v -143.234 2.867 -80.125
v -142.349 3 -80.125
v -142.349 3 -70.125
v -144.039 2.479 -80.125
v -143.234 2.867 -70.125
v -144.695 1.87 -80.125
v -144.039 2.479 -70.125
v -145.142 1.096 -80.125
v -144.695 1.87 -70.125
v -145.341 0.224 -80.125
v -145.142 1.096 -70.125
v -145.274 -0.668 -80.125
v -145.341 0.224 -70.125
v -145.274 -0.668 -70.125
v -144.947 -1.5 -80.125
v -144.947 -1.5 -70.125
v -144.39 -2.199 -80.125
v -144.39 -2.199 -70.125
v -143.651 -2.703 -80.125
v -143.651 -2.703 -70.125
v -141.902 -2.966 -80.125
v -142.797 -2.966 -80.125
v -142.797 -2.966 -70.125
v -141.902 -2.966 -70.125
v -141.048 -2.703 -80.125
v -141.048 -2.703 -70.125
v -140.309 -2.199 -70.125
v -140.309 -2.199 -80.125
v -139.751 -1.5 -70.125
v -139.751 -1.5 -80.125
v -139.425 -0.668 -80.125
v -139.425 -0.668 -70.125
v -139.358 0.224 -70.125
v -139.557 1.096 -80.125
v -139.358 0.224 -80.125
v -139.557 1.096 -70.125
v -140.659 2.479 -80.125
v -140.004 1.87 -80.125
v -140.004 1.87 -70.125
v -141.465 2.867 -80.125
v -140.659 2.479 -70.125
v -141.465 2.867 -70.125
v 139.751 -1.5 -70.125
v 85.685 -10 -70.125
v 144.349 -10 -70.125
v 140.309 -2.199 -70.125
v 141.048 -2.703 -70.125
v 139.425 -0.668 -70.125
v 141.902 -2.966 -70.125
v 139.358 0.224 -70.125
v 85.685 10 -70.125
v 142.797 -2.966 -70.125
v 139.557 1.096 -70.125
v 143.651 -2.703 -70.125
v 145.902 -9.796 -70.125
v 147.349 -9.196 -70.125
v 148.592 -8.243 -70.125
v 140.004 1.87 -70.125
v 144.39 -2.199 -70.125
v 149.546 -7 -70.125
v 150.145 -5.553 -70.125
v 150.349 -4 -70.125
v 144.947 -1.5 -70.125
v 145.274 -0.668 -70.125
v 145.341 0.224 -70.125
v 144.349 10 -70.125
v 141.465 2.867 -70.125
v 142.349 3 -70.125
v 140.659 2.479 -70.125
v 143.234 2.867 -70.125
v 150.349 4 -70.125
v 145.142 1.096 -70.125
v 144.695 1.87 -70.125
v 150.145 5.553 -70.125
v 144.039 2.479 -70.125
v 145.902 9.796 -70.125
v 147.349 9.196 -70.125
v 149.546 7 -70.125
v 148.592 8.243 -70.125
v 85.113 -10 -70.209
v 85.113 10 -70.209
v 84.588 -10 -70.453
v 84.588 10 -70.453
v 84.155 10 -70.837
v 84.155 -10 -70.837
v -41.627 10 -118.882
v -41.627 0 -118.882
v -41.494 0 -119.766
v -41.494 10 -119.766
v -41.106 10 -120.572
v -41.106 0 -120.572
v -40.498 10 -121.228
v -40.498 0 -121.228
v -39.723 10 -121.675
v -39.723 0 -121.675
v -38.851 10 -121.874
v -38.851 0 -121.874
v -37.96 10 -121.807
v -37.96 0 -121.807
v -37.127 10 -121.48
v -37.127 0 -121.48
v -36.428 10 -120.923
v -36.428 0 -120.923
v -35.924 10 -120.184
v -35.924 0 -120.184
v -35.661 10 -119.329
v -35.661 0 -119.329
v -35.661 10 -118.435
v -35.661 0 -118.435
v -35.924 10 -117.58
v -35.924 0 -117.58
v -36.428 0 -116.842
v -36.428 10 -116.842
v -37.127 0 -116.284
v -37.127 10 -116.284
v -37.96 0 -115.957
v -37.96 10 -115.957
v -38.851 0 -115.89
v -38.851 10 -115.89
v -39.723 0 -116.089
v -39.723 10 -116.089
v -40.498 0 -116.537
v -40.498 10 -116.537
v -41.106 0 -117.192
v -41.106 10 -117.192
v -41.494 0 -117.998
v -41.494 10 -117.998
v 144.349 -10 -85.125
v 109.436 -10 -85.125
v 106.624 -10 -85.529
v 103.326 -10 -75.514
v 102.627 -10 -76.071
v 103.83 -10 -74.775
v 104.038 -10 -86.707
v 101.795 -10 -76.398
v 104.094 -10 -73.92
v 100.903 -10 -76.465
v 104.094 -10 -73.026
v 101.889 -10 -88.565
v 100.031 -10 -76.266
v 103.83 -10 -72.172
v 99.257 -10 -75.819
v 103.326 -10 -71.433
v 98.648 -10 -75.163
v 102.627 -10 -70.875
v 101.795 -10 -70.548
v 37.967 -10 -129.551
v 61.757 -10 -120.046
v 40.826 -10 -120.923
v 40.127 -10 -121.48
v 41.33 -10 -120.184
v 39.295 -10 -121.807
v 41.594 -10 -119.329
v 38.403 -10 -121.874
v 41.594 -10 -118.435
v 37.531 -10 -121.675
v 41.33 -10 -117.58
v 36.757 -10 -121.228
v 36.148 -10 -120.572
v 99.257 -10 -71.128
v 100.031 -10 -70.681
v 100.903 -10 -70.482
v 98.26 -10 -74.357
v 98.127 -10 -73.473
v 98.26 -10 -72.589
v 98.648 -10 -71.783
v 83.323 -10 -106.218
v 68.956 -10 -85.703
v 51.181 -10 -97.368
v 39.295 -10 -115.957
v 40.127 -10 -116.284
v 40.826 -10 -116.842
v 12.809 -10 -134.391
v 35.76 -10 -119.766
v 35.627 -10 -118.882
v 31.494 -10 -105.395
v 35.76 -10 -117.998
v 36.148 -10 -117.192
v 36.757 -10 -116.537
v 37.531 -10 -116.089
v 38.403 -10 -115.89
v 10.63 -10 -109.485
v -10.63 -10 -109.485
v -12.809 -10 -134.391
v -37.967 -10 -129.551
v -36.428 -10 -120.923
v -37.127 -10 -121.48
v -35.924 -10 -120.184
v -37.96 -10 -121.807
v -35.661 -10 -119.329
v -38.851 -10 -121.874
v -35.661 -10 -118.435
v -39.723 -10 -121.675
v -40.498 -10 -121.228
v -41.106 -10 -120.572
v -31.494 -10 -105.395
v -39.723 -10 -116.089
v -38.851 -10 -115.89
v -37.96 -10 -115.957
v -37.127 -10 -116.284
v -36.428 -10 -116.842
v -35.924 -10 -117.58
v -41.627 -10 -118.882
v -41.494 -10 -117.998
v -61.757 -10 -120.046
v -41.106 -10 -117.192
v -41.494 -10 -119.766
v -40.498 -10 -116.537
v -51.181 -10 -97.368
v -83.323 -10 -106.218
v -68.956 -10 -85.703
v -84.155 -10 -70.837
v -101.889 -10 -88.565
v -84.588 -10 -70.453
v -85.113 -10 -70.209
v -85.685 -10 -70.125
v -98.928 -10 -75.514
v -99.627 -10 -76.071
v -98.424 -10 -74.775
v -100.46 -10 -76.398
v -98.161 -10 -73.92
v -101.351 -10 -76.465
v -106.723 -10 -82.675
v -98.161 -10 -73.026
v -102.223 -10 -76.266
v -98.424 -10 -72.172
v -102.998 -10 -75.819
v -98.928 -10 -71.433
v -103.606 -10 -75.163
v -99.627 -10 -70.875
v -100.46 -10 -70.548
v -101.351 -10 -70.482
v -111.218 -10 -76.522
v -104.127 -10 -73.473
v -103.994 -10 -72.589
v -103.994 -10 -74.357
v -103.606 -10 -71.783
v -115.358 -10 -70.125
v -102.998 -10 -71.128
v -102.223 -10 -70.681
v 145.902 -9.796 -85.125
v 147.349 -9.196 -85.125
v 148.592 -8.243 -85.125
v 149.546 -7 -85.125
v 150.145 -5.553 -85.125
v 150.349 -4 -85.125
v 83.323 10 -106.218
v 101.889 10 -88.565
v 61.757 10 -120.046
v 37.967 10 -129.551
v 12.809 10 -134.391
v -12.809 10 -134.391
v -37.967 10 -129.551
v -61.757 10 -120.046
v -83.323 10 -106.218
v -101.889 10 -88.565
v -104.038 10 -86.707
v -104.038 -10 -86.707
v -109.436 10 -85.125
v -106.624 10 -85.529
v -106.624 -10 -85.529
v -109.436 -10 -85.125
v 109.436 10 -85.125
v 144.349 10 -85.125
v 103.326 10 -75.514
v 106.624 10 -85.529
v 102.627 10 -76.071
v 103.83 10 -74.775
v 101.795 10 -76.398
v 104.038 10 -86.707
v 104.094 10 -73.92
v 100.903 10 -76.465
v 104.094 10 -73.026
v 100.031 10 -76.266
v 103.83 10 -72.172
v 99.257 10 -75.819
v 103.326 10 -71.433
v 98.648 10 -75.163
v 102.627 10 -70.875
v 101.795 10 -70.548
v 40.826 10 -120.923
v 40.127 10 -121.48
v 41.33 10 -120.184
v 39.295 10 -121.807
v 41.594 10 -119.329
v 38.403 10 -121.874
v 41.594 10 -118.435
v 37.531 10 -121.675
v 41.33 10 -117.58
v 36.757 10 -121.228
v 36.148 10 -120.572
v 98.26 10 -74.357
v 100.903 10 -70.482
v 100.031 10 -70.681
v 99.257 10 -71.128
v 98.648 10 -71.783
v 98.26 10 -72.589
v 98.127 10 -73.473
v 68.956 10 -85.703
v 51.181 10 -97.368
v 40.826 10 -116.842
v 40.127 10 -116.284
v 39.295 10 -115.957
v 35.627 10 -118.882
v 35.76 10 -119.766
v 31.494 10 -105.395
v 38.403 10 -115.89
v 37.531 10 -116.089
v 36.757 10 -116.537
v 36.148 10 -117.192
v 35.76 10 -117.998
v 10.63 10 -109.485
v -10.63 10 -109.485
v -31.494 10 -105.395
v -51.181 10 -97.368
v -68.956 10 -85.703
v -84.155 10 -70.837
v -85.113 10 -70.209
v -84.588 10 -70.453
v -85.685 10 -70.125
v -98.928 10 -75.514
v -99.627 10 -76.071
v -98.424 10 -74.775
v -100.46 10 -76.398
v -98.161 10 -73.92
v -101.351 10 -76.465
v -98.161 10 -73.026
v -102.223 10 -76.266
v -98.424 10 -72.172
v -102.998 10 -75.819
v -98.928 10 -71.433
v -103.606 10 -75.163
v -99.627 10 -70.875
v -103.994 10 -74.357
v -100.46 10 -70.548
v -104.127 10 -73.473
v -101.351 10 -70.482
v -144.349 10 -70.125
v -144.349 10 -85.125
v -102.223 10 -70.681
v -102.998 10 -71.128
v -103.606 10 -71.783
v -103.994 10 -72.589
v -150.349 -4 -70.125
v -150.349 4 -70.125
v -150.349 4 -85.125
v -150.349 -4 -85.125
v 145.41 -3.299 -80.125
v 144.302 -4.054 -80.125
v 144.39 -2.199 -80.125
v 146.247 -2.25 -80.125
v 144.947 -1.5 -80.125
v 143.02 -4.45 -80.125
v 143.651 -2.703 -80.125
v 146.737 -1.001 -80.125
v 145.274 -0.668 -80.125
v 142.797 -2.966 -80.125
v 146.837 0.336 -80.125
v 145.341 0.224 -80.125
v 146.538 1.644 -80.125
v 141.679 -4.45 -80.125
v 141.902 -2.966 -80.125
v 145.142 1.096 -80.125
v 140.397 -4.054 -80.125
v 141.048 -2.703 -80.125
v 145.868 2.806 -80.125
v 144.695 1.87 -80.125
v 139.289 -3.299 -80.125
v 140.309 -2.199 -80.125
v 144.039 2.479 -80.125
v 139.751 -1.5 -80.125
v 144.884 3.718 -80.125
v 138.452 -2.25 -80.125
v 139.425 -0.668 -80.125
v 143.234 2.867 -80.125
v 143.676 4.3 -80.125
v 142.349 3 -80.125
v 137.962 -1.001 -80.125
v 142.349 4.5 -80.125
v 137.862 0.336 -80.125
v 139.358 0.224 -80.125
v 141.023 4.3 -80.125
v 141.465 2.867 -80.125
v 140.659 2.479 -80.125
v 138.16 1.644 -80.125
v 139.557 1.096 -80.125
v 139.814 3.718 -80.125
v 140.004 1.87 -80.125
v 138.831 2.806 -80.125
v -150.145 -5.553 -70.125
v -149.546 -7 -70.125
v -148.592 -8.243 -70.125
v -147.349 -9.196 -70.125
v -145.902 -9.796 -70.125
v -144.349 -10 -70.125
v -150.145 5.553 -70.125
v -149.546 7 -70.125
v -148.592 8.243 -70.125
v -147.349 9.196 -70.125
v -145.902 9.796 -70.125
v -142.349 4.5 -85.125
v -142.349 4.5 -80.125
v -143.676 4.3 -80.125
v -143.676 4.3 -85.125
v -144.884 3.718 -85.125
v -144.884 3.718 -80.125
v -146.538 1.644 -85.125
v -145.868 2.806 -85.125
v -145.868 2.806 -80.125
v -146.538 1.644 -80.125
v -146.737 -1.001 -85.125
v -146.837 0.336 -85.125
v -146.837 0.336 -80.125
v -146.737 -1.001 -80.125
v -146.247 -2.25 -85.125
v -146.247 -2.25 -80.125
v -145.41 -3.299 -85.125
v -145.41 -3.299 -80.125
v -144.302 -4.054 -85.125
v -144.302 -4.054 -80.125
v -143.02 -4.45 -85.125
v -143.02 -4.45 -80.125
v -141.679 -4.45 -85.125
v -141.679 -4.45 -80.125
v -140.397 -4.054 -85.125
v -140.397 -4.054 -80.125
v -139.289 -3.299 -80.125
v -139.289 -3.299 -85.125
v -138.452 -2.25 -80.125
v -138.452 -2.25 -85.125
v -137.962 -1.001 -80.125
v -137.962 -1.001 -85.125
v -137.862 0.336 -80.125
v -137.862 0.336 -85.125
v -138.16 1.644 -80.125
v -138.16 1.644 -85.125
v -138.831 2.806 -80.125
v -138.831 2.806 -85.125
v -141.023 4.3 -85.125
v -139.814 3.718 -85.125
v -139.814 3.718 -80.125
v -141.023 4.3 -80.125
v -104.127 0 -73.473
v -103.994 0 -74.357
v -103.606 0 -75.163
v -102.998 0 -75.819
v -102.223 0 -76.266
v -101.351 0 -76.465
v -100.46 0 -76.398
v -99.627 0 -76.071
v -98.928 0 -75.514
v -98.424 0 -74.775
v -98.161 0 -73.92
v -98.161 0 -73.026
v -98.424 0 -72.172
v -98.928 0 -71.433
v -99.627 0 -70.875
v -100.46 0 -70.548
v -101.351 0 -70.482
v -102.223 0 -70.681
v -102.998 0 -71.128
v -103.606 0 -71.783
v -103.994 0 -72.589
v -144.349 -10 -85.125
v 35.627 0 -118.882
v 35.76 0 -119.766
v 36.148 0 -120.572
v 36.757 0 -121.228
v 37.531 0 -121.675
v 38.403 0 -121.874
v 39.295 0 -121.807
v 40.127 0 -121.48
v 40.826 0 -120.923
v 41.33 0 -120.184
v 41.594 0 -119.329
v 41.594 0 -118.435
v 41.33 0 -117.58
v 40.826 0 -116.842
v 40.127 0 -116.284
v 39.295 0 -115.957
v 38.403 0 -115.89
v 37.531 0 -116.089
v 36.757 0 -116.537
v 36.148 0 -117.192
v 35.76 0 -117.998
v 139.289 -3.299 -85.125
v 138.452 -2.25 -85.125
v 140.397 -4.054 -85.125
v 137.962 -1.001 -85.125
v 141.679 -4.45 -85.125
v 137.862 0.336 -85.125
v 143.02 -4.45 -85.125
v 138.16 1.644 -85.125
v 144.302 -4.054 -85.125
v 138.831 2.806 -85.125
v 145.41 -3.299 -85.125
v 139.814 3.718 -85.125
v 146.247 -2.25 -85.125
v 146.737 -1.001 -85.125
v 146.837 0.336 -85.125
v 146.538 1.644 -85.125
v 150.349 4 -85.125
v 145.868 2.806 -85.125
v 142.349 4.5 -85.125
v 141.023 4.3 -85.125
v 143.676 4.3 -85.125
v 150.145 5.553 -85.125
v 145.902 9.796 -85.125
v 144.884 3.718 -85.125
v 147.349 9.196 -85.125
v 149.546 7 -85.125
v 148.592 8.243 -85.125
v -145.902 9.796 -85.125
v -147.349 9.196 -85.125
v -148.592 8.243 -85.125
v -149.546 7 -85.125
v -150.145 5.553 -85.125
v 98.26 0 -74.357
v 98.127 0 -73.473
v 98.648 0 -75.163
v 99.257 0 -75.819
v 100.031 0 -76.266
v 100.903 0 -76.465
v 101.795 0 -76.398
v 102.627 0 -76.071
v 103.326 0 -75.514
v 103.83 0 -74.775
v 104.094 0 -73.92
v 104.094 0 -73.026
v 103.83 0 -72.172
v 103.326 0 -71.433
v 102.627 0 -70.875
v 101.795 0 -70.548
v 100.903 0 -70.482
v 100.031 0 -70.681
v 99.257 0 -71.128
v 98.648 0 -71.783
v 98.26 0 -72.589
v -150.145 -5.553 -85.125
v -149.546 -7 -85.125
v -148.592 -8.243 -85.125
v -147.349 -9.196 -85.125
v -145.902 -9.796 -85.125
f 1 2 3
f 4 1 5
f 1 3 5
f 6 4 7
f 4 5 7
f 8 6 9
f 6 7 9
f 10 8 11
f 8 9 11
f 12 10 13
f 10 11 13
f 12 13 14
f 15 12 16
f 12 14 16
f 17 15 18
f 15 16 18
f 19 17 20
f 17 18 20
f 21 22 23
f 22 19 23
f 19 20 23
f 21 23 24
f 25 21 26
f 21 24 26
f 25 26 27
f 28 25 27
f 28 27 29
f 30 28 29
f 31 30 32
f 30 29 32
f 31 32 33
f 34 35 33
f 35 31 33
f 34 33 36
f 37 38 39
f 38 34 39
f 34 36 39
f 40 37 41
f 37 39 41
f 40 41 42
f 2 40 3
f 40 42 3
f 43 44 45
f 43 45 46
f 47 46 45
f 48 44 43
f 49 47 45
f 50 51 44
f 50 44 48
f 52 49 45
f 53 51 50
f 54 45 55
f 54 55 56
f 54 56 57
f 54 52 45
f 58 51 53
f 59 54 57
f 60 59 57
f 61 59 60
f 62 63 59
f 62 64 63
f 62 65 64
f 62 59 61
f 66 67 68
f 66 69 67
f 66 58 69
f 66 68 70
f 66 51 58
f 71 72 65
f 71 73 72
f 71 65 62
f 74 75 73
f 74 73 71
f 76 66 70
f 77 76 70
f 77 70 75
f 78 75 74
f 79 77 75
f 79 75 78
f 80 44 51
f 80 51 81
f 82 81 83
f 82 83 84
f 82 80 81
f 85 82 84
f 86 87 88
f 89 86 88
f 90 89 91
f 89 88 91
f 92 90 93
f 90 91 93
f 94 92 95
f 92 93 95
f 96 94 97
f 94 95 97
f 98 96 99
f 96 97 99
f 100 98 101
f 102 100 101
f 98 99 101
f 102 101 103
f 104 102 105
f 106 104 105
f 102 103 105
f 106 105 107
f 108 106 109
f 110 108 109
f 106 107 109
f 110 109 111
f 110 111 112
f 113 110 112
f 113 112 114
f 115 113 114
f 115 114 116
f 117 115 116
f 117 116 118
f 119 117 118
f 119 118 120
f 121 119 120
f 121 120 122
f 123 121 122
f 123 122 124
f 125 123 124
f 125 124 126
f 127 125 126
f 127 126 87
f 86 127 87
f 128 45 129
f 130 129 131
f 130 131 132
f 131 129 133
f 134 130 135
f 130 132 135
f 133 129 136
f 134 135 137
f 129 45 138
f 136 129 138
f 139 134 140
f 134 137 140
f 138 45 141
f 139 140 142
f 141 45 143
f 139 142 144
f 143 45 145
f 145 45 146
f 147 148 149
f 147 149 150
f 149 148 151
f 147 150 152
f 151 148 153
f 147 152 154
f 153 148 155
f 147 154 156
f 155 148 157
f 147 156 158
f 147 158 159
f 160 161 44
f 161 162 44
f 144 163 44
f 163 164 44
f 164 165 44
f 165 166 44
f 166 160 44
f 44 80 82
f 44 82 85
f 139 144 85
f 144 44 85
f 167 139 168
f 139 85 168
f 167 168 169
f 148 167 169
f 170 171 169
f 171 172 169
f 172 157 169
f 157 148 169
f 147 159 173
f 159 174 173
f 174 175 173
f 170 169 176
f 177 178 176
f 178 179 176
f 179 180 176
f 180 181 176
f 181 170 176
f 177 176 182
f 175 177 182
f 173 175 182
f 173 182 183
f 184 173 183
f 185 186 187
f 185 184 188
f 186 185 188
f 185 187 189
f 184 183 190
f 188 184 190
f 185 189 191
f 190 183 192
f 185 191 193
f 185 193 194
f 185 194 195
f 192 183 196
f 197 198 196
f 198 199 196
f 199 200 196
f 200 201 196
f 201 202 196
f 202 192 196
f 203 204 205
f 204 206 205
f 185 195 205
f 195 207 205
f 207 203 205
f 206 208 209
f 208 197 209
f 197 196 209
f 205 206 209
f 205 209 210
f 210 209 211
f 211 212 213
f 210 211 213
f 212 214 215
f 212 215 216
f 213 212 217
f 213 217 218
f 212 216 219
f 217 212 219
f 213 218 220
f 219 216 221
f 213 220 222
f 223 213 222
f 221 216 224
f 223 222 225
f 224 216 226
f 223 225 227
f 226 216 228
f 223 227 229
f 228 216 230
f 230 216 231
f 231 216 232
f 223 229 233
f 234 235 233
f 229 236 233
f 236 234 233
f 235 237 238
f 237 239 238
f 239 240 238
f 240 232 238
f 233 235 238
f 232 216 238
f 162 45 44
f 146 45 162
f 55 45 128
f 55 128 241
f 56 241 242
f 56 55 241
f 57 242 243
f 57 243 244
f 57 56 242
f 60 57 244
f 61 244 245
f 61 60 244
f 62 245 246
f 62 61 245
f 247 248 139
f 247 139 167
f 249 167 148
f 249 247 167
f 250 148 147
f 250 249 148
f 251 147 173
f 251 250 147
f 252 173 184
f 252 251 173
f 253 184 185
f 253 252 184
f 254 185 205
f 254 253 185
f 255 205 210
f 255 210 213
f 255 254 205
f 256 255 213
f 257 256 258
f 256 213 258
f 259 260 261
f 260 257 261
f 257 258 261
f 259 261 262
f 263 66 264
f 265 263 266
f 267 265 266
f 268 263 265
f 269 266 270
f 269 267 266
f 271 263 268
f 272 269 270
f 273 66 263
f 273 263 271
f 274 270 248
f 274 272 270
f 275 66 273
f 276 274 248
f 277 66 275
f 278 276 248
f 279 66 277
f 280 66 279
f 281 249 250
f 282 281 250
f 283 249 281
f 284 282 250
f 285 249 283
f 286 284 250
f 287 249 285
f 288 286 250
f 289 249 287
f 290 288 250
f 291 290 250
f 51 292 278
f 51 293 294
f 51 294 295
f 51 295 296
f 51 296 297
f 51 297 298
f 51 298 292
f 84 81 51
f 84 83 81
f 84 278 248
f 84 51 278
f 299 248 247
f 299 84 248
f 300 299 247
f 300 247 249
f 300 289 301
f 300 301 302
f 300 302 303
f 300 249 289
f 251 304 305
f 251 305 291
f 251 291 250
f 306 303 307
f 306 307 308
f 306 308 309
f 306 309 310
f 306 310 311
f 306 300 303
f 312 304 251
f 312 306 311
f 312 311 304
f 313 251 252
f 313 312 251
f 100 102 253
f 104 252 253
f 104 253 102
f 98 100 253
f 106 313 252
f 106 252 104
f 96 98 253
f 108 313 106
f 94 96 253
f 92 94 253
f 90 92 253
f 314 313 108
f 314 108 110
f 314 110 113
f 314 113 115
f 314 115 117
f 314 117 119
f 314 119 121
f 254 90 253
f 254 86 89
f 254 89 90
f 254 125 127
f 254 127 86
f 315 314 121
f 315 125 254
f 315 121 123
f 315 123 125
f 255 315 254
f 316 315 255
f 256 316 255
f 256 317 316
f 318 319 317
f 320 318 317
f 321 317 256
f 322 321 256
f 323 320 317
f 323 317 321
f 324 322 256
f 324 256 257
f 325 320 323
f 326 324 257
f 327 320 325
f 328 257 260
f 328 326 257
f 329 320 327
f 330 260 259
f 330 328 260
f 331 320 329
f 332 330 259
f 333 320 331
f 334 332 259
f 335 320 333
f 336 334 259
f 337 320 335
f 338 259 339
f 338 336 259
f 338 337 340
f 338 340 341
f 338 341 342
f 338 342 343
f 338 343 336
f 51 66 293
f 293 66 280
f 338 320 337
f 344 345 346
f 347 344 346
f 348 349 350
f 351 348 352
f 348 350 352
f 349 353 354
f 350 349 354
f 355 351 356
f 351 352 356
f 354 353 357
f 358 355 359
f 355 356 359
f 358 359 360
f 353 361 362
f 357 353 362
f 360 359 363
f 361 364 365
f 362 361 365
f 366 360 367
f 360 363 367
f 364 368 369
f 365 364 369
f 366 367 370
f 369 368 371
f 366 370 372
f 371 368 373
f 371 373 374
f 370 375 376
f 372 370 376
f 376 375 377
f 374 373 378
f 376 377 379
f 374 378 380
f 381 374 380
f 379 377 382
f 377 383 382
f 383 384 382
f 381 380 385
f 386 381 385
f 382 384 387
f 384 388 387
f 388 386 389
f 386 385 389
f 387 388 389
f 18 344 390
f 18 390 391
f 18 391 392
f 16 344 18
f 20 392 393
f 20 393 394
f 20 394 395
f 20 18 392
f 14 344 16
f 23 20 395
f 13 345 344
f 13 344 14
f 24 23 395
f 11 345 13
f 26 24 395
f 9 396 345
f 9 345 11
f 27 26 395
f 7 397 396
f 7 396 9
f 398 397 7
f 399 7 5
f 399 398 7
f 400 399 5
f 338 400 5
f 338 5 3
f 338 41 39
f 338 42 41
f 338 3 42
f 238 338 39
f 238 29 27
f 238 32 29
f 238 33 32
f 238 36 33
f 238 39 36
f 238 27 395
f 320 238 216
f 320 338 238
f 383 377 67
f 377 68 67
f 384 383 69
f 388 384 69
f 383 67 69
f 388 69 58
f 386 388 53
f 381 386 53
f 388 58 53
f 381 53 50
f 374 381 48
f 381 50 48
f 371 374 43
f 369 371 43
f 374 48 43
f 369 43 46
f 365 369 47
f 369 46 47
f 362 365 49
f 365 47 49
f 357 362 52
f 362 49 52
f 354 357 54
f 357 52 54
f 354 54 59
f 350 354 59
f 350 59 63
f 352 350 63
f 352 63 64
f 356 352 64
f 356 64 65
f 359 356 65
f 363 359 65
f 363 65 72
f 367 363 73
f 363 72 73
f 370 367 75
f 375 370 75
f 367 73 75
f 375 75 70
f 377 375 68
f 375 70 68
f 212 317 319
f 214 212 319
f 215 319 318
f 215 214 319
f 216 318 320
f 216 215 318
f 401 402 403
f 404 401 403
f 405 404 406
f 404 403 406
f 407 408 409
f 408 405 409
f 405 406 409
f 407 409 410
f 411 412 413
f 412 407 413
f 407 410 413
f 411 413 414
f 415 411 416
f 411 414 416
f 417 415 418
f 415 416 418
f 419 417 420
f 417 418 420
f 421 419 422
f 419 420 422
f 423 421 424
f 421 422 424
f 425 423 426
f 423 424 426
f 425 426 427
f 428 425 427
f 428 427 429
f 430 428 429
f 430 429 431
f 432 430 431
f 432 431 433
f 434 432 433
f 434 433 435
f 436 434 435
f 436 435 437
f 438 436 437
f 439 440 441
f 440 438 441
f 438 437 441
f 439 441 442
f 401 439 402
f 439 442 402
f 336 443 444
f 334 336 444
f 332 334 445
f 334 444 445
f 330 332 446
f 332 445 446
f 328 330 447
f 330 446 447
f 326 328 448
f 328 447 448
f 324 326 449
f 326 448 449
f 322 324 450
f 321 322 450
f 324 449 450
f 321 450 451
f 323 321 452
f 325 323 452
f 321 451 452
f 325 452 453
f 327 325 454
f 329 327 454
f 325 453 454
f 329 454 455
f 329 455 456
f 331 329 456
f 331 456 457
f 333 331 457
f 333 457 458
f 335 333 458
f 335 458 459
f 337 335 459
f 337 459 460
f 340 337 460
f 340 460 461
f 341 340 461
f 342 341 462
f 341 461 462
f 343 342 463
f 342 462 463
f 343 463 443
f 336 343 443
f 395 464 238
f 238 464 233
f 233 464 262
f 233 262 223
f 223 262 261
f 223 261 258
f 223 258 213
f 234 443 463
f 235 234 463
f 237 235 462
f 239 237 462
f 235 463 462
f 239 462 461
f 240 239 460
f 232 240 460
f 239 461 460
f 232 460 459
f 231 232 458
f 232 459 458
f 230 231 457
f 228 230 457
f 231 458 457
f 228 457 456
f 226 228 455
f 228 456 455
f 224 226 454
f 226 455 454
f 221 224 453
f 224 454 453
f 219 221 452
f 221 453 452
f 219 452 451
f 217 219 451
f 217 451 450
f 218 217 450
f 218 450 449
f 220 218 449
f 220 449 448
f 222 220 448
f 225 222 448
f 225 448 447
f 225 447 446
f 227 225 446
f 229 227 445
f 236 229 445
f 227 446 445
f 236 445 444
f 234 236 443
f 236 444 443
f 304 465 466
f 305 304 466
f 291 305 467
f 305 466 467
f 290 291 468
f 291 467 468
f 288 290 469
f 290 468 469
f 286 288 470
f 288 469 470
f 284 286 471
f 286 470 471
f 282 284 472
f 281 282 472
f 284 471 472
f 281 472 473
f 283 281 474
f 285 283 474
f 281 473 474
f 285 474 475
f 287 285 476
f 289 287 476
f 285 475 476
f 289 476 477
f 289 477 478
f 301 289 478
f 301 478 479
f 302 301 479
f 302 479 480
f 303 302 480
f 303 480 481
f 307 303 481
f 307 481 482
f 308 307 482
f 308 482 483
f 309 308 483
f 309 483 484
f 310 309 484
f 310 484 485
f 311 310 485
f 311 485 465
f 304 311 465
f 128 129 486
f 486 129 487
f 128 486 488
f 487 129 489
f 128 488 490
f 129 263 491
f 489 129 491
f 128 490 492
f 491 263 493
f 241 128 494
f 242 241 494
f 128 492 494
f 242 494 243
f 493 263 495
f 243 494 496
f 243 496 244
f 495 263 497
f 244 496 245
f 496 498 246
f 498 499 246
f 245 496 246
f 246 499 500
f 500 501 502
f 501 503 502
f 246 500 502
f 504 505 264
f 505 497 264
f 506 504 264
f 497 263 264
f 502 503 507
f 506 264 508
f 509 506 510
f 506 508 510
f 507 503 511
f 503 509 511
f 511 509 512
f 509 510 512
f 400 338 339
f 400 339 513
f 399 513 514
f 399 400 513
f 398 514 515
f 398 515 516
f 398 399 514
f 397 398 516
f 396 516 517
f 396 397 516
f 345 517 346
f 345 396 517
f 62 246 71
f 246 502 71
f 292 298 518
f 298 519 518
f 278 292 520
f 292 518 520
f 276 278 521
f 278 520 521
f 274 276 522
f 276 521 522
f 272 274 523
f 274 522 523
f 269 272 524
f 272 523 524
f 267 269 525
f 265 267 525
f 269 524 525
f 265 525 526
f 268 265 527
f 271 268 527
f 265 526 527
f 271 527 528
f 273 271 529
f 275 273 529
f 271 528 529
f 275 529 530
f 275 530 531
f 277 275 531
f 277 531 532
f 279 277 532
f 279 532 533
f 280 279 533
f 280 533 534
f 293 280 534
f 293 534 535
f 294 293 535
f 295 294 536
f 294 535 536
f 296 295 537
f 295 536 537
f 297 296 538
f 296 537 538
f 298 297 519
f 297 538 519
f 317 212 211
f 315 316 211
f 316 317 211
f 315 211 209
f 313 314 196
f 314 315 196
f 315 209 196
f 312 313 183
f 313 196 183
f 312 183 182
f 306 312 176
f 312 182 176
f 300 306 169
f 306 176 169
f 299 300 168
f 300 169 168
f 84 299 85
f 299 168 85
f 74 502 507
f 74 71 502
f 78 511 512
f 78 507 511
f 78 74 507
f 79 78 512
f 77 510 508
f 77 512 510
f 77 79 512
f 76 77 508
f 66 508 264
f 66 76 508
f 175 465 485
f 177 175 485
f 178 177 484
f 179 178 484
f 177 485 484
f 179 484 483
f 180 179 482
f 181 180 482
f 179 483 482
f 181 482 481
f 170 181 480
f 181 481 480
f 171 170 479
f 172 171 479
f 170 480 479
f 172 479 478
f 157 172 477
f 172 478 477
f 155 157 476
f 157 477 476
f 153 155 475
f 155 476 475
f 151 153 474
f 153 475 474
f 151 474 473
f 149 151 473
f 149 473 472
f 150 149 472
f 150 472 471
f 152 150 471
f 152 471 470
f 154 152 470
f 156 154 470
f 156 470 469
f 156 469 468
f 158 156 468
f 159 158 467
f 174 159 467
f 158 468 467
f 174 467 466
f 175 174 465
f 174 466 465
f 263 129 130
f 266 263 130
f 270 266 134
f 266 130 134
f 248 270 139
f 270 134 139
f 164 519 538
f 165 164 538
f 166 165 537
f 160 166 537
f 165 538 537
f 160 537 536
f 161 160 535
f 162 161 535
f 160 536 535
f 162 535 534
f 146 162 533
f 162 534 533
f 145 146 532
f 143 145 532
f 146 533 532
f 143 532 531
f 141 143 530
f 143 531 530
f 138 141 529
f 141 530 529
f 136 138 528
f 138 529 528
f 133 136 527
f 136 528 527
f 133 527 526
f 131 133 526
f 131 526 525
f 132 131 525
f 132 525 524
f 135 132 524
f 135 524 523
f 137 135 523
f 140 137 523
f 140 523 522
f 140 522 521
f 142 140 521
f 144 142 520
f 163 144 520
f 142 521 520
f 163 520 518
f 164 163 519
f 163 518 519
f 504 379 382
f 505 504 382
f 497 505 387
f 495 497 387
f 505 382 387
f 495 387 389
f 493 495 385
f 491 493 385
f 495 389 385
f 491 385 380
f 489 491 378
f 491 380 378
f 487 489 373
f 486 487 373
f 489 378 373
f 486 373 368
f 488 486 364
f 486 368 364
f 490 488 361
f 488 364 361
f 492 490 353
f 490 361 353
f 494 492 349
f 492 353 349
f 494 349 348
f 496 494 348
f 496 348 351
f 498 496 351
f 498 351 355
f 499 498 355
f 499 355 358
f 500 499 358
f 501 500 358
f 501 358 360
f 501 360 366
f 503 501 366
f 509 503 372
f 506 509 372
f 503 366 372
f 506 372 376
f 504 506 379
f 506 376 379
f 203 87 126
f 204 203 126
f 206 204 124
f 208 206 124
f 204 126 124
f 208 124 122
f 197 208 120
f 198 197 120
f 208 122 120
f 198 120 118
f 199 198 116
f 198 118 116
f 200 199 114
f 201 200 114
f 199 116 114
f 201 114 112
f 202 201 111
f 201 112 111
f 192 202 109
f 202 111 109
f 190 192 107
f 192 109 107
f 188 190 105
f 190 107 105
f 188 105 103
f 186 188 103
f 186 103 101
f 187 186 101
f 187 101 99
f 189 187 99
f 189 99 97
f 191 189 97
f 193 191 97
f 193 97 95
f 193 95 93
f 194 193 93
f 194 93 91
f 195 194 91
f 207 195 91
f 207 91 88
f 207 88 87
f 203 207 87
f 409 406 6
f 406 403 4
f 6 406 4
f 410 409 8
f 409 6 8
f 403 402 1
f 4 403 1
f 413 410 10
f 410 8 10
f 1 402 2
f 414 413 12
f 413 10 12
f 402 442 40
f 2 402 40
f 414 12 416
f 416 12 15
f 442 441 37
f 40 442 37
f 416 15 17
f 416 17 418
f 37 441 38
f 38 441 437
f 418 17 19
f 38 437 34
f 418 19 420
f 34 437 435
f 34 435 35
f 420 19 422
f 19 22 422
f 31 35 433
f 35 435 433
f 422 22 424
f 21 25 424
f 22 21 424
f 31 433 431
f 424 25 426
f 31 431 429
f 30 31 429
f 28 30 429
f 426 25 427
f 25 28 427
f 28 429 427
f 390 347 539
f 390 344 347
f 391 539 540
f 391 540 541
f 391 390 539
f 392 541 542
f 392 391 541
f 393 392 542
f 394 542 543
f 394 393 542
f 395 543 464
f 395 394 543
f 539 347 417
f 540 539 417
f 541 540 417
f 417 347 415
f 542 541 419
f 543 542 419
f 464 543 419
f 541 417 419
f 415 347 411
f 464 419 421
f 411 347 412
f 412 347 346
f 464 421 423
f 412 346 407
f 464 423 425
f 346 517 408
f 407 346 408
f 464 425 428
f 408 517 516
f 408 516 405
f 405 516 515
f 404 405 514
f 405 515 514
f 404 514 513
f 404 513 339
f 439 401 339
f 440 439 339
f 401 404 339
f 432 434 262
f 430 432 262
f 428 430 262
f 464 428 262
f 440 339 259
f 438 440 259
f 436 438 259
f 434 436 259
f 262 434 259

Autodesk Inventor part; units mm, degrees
ref_plane "YZ Plane" through (0, 0, 0) normal (1, 0, 0) x (0, 1, 0)
ref_plane "XZ Plane" through (0, 0, 0) normal (0, 1, 0) x (-1, 0, 0)
ref_plane "XY Plane" through (0, 0, 0) normal (0, 0, 1) x (1, 0, 0)
sketch "Sketch1" plane through (0, 0, 0) normal (0, 1, 0) x (-1, 0, 0)
  circle A0 centre (0, 0) radius 135
  circle A1 centre (0, 0) radius 110
  circle A2 centre (0, 0) radius 125
  circle A3 centre (-125, 0) radius 3
  circle A4 centre (-101.1271, -73.4732) radius 3
  circle A5 centre (-38.6271, -118.8821) radius 3
  circle A6 centre (38.6271, -118.8821) radius 3
  circle A7 centre (101.1271, -73.4732) radius 3
  circle A8 centre (125, 0) radius 3
  circle A9 centre (101.1271, 73.4732) radius 3
  circle A10 centre (38.6271, 118.8821) radius 3
  circle A11 centre (-38.6271, 118.8821) radius 3
  circle A12 centre (-101.1271, 73.4732) radius 3
  dimension "d69" = 250
  dimension "d0" = 270
  dimension "d1" = 220
  dimension "d75" = 6
  dimension "d78" = 360
extrude "Extrusion1" add sketch "Sketch1" along normal mid plane 20 contours A0 | A8 A2 A7 A6 A5 A4 A3 A12 A11 A10 A9
sketch "Sketch4" plane through (0, 10, 0) normal (0, 1, 0) x (1, 0, 0)
  circle A0 centre (0, 0) radius 50.125
  circle A1 centre (0, 0) radius 135 projected
  circle A2 centre (0, 0) radius 110 projected
  line L0 (125.3494, 50.125) -> (150.3494, 50.125)
  line L1 (150.3494, 50.125) -> (150.3494, 35.125)
  line L2 (150.3494, 35.125) -> (125.3494, 35.125)
  line L3 (125.3494, 35.125) -> (125.3494, 50.125)
  line L4 (150.3494, 70.125) -> (104.7795, 70.125)
  line L5 (104.7795, 70.125) -> (104.7795, 85.125)
  line L6 (104.7795, 85.125) -> (150.3494, 85.125)
  line L7 (150.3494, 85.125) -> (150.3494, 70.125)
  line L8 (103.1497, 60.125) -> (138.3886, 60.125) construction
  point P0 (130.3504, 35.125)
  point P1 (115.3581, 70.125)
  dimension "d21" = 100.25
  dimension "d22" = 25
  dimension "d23" = 15
  dimension "d24" = 20
  dimension "d25" = 15
  dimension "d57" = 10
extrude "Extrusion3" add sketch "Sketch4" against normal up to surface (20 mm away) contours L6 L7 L4 A1 | A1 L0 L1 L2
fillet "Fillet1" radius 6 4 edges at (150.3494, 10, -77.625) (150.3494, -10, -77.625) (150.3494, -10, -42.625) (150.3494, 10, -42.625)
fillet "Fillet2" radius 10 1 edges at (104.7795, 0, -85.125)
fillet "Fillet3" radius 2 1 edges at (130.3504, 0, -35.125)
sketch "Sketch5" plane through (150.3494, -4, -85.125) normal (0, 0, -1) x (-1, 0, 0)
  line L0 (0, 8) -> (0, 0) projected
  line L1 (40.9135, -6) -> (6, -6) projected
  point P0 (150.3494, 4)
  point P1 (8, 4)
  point P2 (0, 4)
  dimension "d38" = 8
  dimension "d39" = 10
hole "Hole2" at (142.3494, 0, -85.125) direction (0, 0, 1) diameter 6 depth 50 counterbore diameter 9 counterbore depth 5
mirror "Mirror1" about plane through (0, 0, 0) normal (1, 0, 0) of "Extrusion3", "Fillet1", "Fillet2", "Fillet3", "Hole2"
mirror "Mirror2" about plane through (0, 0, 0) normal (0, 0, 1) of "Extrusion3", "Fillet1", "Fillet2", "Fillet3", "Hole2"
sketch "Sketch7" plane through (0, 10, 0) normal (0, 1, 0) x (1, 0, 0)
  line L0 (0, 0) -> (0, -158.0698) construction
  point P0 (0, -127.5)
  dimension "d50" = 127.5
hole "Hole3" at (0, 10, 127.5) direction (0, -1, 0) diameter 5 end through all
sketch "Sketch11" plane through (0, 10, 0) normal (0, 1, 0) x (1, 0, 0)
  line L0 (-158.7443, 70.125) -> (165.1324, 70.125)
  line L1 (165.1324, 70.125) -> (165.1324, -140.5382)
  line L2 (165.1324, -140.5382) -> (-158.7443, -140.5382)
  line L3 (-158.7443, -140.5382) -> (-158.7443, 70.125)
  point P0 (0, 0)
extrude "Extrusion7" cut sketch "Sketch11" against normal through all
fillet "Fillet7" radius 2 2 edges at (-84.7495, 0, -70.125) (84.7495, 0, -70.125)
properties part number "Cylinder 80-20 Spacer_2"
